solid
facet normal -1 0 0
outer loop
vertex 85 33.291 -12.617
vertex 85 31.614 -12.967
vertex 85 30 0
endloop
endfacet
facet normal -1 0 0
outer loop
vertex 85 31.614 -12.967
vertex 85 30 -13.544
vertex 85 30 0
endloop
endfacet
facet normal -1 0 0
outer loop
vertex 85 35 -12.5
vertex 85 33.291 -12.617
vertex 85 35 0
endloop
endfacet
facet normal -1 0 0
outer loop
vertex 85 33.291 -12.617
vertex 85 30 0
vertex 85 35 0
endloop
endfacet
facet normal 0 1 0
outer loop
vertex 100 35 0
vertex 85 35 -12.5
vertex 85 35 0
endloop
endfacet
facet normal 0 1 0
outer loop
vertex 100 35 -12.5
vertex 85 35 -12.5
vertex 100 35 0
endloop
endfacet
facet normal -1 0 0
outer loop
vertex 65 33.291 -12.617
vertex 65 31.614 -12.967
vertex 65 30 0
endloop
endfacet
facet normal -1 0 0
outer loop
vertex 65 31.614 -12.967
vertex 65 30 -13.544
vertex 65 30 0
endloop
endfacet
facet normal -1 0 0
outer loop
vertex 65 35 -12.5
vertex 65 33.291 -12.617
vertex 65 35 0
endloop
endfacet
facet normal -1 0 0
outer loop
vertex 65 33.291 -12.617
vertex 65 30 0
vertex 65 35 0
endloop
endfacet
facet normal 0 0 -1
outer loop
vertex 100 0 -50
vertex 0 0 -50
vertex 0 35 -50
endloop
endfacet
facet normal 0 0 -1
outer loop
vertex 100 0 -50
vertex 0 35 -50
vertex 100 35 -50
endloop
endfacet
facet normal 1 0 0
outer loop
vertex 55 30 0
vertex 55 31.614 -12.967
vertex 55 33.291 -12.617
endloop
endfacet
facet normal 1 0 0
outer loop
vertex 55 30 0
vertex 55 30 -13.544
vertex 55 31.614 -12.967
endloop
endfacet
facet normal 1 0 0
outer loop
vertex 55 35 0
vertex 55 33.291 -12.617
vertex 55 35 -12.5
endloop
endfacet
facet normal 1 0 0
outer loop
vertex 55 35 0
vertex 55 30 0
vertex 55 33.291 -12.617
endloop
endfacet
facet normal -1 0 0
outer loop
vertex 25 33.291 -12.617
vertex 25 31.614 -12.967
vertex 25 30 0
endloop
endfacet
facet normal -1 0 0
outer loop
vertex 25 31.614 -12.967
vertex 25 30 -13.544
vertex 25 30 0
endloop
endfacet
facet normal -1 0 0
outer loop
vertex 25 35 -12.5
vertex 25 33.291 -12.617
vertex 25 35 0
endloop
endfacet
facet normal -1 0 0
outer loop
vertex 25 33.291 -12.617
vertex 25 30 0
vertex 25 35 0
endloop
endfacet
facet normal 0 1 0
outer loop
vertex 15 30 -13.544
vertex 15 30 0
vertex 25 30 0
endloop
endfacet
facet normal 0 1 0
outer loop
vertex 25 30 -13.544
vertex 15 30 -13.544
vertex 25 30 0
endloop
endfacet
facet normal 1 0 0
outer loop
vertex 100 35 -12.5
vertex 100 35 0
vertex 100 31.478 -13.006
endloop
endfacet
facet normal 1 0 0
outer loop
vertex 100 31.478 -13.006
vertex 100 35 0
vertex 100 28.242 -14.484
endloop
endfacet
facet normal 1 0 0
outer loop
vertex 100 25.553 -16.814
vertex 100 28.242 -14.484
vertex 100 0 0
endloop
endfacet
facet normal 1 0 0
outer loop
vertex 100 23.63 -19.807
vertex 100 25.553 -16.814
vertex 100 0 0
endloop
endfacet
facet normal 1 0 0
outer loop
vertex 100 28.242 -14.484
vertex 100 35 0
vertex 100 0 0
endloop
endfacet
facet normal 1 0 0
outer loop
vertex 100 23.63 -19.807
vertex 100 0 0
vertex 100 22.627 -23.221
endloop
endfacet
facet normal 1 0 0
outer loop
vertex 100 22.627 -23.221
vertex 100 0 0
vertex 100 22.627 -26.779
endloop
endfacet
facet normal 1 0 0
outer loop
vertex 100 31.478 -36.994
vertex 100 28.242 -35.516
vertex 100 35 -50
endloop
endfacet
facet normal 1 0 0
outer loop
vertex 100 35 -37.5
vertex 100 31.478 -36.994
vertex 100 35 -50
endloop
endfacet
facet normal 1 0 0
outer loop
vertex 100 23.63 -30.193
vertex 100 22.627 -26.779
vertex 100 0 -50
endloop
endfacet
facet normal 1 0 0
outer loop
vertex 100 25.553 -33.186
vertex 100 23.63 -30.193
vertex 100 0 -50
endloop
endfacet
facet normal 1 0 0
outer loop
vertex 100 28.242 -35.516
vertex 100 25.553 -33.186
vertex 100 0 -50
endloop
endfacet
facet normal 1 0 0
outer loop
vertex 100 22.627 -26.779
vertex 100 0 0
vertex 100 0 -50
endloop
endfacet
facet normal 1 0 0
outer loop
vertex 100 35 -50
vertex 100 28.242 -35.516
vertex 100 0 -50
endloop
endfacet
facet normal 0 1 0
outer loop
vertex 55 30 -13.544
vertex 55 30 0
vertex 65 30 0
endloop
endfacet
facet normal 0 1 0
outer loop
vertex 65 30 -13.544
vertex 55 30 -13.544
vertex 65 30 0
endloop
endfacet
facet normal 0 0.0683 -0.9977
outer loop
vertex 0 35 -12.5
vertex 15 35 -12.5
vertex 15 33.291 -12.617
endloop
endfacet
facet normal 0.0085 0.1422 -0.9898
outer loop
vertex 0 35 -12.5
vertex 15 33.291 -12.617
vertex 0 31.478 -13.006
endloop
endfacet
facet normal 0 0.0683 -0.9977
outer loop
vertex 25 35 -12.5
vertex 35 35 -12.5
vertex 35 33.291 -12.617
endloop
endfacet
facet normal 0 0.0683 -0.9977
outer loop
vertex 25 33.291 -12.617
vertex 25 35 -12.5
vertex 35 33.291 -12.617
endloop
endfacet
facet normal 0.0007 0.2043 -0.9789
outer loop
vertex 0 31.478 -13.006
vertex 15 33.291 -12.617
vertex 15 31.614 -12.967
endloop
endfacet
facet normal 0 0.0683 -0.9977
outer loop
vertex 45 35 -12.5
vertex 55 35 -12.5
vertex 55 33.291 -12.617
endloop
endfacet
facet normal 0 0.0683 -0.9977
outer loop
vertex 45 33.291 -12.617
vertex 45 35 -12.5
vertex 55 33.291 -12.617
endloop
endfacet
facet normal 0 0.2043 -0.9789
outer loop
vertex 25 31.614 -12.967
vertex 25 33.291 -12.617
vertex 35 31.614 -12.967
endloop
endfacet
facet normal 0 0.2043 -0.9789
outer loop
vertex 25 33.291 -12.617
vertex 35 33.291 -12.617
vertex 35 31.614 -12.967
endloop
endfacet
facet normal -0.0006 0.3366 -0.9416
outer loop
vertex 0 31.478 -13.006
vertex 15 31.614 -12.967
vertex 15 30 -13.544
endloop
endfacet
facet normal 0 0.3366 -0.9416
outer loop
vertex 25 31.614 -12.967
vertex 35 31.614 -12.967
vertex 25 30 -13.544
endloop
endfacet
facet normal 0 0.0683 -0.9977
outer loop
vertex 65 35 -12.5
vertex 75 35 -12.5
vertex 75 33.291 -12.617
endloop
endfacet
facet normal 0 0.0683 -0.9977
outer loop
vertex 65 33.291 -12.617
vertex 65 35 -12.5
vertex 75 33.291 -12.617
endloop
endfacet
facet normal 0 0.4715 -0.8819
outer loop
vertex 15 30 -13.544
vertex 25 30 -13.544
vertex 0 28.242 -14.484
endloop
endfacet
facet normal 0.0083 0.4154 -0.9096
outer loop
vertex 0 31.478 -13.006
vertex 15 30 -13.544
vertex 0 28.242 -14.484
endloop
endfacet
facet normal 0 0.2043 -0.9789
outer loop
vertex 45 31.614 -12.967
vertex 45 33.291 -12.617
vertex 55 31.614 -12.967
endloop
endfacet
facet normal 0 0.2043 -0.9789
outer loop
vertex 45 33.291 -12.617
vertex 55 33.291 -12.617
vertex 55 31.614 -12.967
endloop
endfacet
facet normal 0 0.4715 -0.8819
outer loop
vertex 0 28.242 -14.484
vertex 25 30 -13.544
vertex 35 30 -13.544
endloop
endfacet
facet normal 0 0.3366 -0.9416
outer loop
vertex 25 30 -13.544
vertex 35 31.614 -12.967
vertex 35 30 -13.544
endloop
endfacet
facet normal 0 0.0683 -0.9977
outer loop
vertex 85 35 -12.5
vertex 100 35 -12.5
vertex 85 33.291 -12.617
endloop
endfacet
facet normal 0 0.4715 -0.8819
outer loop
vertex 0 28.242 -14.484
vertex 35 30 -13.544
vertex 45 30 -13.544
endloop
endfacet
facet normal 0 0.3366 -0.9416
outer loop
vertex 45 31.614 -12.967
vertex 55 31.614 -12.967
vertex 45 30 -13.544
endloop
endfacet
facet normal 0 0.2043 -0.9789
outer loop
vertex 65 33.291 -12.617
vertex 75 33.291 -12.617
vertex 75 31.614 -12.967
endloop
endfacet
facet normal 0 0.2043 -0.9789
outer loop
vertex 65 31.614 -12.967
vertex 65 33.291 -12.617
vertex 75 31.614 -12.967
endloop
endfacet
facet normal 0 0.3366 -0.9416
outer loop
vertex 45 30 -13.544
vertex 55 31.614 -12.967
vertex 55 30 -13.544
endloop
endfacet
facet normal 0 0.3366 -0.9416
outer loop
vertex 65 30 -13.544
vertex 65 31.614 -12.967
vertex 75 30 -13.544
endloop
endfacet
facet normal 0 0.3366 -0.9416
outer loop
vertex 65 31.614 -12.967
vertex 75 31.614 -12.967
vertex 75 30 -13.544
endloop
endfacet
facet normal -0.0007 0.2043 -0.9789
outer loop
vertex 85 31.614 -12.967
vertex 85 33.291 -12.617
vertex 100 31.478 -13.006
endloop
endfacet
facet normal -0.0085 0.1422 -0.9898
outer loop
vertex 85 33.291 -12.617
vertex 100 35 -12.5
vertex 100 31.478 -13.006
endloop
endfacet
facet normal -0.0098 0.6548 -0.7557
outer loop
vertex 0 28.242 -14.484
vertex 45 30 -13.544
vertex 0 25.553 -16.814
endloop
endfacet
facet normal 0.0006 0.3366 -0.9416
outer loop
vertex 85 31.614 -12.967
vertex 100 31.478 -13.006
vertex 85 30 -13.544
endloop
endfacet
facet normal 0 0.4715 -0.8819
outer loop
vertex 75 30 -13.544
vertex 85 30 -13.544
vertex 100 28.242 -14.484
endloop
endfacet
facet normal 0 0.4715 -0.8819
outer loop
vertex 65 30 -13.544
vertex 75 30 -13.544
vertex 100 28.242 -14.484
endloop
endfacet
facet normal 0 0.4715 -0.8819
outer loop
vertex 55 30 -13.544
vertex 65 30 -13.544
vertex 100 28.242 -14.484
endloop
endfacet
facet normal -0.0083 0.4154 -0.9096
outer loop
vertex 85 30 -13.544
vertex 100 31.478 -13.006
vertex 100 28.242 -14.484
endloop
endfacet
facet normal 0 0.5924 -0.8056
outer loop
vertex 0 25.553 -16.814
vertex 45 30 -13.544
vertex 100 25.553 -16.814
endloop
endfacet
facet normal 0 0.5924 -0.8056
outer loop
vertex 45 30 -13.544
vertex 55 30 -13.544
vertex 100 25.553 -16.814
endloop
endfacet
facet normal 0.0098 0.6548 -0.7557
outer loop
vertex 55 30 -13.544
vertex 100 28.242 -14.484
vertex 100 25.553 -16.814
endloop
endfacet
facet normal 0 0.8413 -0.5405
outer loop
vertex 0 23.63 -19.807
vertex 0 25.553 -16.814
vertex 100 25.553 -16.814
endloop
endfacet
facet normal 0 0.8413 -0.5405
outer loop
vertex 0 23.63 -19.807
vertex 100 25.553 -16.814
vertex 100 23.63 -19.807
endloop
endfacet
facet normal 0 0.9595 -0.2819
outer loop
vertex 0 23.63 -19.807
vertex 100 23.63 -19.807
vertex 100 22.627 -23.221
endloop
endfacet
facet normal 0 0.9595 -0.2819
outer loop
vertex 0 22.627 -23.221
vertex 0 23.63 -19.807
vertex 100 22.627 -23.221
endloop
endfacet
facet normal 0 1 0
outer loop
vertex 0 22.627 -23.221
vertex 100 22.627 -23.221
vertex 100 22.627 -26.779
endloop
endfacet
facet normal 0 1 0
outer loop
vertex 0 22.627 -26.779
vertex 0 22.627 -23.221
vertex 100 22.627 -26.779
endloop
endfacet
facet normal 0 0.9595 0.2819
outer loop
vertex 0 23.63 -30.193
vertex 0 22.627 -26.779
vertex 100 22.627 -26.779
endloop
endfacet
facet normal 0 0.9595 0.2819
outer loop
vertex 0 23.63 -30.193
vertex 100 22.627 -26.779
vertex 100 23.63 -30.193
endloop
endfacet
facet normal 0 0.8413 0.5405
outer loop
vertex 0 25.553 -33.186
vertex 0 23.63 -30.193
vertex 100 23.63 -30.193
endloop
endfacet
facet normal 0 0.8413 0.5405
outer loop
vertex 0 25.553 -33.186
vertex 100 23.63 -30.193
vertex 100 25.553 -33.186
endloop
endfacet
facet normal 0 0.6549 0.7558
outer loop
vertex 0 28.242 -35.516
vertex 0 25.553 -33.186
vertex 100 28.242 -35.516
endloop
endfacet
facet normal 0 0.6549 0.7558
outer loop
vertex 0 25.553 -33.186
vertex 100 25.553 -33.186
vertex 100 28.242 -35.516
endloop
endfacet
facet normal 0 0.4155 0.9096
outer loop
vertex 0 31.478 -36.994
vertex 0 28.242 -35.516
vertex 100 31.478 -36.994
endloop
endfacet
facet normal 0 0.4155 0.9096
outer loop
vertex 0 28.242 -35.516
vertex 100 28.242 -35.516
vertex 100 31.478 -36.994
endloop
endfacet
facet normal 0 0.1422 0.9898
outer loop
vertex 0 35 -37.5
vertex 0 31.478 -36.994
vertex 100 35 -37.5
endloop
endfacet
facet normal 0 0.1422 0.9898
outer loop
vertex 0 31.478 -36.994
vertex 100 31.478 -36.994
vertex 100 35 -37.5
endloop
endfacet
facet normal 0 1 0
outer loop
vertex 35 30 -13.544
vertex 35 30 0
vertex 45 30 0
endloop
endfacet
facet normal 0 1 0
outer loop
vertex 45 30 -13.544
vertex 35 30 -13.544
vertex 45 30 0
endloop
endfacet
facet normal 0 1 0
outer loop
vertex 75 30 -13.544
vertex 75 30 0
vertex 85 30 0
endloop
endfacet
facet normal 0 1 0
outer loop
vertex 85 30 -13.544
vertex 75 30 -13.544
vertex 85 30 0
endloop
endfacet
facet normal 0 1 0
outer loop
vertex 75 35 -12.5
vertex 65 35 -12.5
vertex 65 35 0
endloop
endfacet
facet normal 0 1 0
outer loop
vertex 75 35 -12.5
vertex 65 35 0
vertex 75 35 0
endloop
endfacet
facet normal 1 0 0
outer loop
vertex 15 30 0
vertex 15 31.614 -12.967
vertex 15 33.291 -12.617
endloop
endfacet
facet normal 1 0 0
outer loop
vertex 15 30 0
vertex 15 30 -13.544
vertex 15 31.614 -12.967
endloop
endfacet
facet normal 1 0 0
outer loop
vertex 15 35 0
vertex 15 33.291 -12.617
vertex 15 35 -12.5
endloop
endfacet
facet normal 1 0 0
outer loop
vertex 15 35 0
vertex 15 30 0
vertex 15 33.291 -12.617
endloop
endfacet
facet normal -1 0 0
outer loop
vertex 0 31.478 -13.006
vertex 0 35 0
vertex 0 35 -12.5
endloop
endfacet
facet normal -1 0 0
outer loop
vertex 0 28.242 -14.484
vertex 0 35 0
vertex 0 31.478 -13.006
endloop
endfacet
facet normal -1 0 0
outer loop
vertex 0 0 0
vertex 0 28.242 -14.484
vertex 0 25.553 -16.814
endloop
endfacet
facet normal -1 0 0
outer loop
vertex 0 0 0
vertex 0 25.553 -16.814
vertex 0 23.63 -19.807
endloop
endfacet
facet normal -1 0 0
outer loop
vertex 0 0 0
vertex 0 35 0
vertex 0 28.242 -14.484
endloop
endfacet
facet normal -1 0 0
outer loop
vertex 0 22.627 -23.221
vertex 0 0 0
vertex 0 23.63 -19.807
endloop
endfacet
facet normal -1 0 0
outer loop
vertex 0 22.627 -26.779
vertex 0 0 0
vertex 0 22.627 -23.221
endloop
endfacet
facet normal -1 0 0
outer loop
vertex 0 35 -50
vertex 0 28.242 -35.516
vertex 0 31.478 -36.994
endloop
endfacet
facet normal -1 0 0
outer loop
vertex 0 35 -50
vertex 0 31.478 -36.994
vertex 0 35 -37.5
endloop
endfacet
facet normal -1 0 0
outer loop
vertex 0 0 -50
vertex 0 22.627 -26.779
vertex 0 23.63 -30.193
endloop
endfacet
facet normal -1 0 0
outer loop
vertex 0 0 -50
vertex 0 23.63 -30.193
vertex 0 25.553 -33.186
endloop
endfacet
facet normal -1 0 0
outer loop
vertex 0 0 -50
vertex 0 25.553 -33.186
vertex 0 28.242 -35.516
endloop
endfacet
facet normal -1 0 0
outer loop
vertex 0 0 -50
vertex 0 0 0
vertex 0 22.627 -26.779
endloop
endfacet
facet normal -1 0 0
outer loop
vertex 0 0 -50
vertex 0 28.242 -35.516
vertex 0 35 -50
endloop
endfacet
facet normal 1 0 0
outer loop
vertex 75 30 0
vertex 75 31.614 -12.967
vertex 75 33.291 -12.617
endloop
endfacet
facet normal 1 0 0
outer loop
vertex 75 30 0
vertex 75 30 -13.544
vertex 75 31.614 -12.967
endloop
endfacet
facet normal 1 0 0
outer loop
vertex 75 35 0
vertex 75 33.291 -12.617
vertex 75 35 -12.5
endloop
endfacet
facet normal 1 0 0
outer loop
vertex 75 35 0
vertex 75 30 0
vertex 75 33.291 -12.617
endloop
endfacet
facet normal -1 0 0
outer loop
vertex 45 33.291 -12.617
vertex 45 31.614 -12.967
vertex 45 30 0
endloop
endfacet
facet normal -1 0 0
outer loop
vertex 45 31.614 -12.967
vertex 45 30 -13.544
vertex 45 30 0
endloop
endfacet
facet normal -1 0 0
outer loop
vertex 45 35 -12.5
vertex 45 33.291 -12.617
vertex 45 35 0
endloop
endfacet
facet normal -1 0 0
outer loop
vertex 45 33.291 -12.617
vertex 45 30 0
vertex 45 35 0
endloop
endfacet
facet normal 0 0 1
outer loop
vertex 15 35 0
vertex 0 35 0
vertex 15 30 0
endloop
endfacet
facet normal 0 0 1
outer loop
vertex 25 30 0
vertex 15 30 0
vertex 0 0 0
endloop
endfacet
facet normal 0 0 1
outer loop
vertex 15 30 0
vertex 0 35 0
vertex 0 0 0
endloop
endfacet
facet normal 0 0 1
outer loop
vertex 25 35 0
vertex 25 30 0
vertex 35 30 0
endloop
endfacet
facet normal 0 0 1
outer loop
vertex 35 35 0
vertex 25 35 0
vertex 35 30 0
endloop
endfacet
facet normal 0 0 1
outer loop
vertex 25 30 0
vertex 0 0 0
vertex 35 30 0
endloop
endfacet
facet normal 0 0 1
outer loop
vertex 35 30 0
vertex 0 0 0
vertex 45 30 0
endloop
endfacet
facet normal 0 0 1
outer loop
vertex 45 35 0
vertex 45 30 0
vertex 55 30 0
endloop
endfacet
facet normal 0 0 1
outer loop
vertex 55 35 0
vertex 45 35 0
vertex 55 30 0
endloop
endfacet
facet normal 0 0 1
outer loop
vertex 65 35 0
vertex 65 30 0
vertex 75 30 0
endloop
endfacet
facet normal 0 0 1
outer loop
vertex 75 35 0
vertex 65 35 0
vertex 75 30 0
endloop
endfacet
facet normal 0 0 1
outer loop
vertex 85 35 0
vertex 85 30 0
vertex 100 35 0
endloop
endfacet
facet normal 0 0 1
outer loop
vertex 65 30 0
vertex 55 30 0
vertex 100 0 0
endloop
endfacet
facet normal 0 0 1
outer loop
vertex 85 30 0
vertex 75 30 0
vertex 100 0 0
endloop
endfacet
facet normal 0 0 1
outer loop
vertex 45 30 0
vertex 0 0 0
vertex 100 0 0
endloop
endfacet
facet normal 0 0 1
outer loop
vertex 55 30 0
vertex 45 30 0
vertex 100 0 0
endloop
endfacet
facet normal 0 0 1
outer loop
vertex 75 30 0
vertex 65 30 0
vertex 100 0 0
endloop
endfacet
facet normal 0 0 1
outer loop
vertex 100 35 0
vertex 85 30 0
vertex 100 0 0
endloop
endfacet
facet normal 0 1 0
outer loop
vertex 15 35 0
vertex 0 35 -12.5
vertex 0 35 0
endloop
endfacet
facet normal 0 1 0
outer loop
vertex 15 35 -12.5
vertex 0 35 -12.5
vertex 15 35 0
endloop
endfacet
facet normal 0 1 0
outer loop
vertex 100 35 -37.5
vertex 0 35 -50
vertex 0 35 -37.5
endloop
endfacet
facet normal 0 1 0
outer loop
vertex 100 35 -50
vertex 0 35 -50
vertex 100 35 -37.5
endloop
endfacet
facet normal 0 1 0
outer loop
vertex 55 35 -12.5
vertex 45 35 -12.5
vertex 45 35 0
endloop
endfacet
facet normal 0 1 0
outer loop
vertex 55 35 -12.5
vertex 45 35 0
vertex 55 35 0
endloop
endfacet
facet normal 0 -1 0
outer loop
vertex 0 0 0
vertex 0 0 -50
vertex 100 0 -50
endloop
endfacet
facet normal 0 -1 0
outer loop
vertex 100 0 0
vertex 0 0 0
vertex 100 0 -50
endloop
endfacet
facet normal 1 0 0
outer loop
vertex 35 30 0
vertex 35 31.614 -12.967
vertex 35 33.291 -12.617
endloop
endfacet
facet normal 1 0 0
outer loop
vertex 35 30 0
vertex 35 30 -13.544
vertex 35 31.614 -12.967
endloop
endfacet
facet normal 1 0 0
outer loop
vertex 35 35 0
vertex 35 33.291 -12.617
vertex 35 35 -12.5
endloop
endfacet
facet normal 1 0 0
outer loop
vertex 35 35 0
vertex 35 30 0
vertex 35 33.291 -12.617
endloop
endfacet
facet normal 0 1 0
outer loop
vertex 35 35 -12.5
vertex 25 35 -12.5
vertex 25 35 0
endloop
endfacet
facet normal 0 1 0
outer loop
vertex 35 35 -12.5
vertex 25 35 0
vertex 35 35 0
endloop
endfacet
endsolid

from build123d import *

# Parameters (mm, degrees)
SKETCH1_W           = 100
SKETCH1_H           = 50
BOSS_EXTRUDE1_DEPTH = 35
SKETCH2_R           = 12.5
CUT_EXTRUDE1_DEPTH  = 100
SKETCH5_W           = 10
SKETCH5_H           = 5
CUT_EXTRUDE3_DEPTH  = 25


with BuildPart() as part:
    # Sketch1 → Boss-Extrude1 (new body)
    with BuildSketch(Plane(origin=(0, 0, 0), x_dir=(1, 0, 0), z_dir=(0, 1, 0))):
        with Locations((50, 25)):
            Rectangle(SKETCH1_W, SKETCH1_H)
    extrude(amount=BOSS_EXTRUDE1_DEPTH)

    # Sketch2 → Cut-Extrude1 (cut)
    with BuildSketch(Plane(origin=(100, 0, 0), x_dir=(0, 0, -1), z_dir=(1, 0, 0))):
        with Locations((25, 35)):
            Circle(SKETCH2_R)
    extrude(amount=-CUT_EXTRUDE1_DEPTH, mode=Mode.SUBTRACT)

    # Sketch5 → Cut-Extrude3 (cut)
    with BuildSketch(Plane.XY):
        with Locations((20, 32.5)):
            Rectangle(SKETCH5_W, SKETCH5_H)
        with Locations((40, 32.5)):
            Rectangle(SKETCH5_W, SKETCH5_H)
        with Locations((60, 32.5)):
            Rectangle(SKETCH5_W, SKETCH5_H)
        with Locations((80, 32.5)):
            Rectangle(SKETCH5_W, SKETCH5_H)
    extrude(amount=-CUT_EXTRUDE3_DEPTH, mode=Mode.SUBTRACT)


solid = part.part
